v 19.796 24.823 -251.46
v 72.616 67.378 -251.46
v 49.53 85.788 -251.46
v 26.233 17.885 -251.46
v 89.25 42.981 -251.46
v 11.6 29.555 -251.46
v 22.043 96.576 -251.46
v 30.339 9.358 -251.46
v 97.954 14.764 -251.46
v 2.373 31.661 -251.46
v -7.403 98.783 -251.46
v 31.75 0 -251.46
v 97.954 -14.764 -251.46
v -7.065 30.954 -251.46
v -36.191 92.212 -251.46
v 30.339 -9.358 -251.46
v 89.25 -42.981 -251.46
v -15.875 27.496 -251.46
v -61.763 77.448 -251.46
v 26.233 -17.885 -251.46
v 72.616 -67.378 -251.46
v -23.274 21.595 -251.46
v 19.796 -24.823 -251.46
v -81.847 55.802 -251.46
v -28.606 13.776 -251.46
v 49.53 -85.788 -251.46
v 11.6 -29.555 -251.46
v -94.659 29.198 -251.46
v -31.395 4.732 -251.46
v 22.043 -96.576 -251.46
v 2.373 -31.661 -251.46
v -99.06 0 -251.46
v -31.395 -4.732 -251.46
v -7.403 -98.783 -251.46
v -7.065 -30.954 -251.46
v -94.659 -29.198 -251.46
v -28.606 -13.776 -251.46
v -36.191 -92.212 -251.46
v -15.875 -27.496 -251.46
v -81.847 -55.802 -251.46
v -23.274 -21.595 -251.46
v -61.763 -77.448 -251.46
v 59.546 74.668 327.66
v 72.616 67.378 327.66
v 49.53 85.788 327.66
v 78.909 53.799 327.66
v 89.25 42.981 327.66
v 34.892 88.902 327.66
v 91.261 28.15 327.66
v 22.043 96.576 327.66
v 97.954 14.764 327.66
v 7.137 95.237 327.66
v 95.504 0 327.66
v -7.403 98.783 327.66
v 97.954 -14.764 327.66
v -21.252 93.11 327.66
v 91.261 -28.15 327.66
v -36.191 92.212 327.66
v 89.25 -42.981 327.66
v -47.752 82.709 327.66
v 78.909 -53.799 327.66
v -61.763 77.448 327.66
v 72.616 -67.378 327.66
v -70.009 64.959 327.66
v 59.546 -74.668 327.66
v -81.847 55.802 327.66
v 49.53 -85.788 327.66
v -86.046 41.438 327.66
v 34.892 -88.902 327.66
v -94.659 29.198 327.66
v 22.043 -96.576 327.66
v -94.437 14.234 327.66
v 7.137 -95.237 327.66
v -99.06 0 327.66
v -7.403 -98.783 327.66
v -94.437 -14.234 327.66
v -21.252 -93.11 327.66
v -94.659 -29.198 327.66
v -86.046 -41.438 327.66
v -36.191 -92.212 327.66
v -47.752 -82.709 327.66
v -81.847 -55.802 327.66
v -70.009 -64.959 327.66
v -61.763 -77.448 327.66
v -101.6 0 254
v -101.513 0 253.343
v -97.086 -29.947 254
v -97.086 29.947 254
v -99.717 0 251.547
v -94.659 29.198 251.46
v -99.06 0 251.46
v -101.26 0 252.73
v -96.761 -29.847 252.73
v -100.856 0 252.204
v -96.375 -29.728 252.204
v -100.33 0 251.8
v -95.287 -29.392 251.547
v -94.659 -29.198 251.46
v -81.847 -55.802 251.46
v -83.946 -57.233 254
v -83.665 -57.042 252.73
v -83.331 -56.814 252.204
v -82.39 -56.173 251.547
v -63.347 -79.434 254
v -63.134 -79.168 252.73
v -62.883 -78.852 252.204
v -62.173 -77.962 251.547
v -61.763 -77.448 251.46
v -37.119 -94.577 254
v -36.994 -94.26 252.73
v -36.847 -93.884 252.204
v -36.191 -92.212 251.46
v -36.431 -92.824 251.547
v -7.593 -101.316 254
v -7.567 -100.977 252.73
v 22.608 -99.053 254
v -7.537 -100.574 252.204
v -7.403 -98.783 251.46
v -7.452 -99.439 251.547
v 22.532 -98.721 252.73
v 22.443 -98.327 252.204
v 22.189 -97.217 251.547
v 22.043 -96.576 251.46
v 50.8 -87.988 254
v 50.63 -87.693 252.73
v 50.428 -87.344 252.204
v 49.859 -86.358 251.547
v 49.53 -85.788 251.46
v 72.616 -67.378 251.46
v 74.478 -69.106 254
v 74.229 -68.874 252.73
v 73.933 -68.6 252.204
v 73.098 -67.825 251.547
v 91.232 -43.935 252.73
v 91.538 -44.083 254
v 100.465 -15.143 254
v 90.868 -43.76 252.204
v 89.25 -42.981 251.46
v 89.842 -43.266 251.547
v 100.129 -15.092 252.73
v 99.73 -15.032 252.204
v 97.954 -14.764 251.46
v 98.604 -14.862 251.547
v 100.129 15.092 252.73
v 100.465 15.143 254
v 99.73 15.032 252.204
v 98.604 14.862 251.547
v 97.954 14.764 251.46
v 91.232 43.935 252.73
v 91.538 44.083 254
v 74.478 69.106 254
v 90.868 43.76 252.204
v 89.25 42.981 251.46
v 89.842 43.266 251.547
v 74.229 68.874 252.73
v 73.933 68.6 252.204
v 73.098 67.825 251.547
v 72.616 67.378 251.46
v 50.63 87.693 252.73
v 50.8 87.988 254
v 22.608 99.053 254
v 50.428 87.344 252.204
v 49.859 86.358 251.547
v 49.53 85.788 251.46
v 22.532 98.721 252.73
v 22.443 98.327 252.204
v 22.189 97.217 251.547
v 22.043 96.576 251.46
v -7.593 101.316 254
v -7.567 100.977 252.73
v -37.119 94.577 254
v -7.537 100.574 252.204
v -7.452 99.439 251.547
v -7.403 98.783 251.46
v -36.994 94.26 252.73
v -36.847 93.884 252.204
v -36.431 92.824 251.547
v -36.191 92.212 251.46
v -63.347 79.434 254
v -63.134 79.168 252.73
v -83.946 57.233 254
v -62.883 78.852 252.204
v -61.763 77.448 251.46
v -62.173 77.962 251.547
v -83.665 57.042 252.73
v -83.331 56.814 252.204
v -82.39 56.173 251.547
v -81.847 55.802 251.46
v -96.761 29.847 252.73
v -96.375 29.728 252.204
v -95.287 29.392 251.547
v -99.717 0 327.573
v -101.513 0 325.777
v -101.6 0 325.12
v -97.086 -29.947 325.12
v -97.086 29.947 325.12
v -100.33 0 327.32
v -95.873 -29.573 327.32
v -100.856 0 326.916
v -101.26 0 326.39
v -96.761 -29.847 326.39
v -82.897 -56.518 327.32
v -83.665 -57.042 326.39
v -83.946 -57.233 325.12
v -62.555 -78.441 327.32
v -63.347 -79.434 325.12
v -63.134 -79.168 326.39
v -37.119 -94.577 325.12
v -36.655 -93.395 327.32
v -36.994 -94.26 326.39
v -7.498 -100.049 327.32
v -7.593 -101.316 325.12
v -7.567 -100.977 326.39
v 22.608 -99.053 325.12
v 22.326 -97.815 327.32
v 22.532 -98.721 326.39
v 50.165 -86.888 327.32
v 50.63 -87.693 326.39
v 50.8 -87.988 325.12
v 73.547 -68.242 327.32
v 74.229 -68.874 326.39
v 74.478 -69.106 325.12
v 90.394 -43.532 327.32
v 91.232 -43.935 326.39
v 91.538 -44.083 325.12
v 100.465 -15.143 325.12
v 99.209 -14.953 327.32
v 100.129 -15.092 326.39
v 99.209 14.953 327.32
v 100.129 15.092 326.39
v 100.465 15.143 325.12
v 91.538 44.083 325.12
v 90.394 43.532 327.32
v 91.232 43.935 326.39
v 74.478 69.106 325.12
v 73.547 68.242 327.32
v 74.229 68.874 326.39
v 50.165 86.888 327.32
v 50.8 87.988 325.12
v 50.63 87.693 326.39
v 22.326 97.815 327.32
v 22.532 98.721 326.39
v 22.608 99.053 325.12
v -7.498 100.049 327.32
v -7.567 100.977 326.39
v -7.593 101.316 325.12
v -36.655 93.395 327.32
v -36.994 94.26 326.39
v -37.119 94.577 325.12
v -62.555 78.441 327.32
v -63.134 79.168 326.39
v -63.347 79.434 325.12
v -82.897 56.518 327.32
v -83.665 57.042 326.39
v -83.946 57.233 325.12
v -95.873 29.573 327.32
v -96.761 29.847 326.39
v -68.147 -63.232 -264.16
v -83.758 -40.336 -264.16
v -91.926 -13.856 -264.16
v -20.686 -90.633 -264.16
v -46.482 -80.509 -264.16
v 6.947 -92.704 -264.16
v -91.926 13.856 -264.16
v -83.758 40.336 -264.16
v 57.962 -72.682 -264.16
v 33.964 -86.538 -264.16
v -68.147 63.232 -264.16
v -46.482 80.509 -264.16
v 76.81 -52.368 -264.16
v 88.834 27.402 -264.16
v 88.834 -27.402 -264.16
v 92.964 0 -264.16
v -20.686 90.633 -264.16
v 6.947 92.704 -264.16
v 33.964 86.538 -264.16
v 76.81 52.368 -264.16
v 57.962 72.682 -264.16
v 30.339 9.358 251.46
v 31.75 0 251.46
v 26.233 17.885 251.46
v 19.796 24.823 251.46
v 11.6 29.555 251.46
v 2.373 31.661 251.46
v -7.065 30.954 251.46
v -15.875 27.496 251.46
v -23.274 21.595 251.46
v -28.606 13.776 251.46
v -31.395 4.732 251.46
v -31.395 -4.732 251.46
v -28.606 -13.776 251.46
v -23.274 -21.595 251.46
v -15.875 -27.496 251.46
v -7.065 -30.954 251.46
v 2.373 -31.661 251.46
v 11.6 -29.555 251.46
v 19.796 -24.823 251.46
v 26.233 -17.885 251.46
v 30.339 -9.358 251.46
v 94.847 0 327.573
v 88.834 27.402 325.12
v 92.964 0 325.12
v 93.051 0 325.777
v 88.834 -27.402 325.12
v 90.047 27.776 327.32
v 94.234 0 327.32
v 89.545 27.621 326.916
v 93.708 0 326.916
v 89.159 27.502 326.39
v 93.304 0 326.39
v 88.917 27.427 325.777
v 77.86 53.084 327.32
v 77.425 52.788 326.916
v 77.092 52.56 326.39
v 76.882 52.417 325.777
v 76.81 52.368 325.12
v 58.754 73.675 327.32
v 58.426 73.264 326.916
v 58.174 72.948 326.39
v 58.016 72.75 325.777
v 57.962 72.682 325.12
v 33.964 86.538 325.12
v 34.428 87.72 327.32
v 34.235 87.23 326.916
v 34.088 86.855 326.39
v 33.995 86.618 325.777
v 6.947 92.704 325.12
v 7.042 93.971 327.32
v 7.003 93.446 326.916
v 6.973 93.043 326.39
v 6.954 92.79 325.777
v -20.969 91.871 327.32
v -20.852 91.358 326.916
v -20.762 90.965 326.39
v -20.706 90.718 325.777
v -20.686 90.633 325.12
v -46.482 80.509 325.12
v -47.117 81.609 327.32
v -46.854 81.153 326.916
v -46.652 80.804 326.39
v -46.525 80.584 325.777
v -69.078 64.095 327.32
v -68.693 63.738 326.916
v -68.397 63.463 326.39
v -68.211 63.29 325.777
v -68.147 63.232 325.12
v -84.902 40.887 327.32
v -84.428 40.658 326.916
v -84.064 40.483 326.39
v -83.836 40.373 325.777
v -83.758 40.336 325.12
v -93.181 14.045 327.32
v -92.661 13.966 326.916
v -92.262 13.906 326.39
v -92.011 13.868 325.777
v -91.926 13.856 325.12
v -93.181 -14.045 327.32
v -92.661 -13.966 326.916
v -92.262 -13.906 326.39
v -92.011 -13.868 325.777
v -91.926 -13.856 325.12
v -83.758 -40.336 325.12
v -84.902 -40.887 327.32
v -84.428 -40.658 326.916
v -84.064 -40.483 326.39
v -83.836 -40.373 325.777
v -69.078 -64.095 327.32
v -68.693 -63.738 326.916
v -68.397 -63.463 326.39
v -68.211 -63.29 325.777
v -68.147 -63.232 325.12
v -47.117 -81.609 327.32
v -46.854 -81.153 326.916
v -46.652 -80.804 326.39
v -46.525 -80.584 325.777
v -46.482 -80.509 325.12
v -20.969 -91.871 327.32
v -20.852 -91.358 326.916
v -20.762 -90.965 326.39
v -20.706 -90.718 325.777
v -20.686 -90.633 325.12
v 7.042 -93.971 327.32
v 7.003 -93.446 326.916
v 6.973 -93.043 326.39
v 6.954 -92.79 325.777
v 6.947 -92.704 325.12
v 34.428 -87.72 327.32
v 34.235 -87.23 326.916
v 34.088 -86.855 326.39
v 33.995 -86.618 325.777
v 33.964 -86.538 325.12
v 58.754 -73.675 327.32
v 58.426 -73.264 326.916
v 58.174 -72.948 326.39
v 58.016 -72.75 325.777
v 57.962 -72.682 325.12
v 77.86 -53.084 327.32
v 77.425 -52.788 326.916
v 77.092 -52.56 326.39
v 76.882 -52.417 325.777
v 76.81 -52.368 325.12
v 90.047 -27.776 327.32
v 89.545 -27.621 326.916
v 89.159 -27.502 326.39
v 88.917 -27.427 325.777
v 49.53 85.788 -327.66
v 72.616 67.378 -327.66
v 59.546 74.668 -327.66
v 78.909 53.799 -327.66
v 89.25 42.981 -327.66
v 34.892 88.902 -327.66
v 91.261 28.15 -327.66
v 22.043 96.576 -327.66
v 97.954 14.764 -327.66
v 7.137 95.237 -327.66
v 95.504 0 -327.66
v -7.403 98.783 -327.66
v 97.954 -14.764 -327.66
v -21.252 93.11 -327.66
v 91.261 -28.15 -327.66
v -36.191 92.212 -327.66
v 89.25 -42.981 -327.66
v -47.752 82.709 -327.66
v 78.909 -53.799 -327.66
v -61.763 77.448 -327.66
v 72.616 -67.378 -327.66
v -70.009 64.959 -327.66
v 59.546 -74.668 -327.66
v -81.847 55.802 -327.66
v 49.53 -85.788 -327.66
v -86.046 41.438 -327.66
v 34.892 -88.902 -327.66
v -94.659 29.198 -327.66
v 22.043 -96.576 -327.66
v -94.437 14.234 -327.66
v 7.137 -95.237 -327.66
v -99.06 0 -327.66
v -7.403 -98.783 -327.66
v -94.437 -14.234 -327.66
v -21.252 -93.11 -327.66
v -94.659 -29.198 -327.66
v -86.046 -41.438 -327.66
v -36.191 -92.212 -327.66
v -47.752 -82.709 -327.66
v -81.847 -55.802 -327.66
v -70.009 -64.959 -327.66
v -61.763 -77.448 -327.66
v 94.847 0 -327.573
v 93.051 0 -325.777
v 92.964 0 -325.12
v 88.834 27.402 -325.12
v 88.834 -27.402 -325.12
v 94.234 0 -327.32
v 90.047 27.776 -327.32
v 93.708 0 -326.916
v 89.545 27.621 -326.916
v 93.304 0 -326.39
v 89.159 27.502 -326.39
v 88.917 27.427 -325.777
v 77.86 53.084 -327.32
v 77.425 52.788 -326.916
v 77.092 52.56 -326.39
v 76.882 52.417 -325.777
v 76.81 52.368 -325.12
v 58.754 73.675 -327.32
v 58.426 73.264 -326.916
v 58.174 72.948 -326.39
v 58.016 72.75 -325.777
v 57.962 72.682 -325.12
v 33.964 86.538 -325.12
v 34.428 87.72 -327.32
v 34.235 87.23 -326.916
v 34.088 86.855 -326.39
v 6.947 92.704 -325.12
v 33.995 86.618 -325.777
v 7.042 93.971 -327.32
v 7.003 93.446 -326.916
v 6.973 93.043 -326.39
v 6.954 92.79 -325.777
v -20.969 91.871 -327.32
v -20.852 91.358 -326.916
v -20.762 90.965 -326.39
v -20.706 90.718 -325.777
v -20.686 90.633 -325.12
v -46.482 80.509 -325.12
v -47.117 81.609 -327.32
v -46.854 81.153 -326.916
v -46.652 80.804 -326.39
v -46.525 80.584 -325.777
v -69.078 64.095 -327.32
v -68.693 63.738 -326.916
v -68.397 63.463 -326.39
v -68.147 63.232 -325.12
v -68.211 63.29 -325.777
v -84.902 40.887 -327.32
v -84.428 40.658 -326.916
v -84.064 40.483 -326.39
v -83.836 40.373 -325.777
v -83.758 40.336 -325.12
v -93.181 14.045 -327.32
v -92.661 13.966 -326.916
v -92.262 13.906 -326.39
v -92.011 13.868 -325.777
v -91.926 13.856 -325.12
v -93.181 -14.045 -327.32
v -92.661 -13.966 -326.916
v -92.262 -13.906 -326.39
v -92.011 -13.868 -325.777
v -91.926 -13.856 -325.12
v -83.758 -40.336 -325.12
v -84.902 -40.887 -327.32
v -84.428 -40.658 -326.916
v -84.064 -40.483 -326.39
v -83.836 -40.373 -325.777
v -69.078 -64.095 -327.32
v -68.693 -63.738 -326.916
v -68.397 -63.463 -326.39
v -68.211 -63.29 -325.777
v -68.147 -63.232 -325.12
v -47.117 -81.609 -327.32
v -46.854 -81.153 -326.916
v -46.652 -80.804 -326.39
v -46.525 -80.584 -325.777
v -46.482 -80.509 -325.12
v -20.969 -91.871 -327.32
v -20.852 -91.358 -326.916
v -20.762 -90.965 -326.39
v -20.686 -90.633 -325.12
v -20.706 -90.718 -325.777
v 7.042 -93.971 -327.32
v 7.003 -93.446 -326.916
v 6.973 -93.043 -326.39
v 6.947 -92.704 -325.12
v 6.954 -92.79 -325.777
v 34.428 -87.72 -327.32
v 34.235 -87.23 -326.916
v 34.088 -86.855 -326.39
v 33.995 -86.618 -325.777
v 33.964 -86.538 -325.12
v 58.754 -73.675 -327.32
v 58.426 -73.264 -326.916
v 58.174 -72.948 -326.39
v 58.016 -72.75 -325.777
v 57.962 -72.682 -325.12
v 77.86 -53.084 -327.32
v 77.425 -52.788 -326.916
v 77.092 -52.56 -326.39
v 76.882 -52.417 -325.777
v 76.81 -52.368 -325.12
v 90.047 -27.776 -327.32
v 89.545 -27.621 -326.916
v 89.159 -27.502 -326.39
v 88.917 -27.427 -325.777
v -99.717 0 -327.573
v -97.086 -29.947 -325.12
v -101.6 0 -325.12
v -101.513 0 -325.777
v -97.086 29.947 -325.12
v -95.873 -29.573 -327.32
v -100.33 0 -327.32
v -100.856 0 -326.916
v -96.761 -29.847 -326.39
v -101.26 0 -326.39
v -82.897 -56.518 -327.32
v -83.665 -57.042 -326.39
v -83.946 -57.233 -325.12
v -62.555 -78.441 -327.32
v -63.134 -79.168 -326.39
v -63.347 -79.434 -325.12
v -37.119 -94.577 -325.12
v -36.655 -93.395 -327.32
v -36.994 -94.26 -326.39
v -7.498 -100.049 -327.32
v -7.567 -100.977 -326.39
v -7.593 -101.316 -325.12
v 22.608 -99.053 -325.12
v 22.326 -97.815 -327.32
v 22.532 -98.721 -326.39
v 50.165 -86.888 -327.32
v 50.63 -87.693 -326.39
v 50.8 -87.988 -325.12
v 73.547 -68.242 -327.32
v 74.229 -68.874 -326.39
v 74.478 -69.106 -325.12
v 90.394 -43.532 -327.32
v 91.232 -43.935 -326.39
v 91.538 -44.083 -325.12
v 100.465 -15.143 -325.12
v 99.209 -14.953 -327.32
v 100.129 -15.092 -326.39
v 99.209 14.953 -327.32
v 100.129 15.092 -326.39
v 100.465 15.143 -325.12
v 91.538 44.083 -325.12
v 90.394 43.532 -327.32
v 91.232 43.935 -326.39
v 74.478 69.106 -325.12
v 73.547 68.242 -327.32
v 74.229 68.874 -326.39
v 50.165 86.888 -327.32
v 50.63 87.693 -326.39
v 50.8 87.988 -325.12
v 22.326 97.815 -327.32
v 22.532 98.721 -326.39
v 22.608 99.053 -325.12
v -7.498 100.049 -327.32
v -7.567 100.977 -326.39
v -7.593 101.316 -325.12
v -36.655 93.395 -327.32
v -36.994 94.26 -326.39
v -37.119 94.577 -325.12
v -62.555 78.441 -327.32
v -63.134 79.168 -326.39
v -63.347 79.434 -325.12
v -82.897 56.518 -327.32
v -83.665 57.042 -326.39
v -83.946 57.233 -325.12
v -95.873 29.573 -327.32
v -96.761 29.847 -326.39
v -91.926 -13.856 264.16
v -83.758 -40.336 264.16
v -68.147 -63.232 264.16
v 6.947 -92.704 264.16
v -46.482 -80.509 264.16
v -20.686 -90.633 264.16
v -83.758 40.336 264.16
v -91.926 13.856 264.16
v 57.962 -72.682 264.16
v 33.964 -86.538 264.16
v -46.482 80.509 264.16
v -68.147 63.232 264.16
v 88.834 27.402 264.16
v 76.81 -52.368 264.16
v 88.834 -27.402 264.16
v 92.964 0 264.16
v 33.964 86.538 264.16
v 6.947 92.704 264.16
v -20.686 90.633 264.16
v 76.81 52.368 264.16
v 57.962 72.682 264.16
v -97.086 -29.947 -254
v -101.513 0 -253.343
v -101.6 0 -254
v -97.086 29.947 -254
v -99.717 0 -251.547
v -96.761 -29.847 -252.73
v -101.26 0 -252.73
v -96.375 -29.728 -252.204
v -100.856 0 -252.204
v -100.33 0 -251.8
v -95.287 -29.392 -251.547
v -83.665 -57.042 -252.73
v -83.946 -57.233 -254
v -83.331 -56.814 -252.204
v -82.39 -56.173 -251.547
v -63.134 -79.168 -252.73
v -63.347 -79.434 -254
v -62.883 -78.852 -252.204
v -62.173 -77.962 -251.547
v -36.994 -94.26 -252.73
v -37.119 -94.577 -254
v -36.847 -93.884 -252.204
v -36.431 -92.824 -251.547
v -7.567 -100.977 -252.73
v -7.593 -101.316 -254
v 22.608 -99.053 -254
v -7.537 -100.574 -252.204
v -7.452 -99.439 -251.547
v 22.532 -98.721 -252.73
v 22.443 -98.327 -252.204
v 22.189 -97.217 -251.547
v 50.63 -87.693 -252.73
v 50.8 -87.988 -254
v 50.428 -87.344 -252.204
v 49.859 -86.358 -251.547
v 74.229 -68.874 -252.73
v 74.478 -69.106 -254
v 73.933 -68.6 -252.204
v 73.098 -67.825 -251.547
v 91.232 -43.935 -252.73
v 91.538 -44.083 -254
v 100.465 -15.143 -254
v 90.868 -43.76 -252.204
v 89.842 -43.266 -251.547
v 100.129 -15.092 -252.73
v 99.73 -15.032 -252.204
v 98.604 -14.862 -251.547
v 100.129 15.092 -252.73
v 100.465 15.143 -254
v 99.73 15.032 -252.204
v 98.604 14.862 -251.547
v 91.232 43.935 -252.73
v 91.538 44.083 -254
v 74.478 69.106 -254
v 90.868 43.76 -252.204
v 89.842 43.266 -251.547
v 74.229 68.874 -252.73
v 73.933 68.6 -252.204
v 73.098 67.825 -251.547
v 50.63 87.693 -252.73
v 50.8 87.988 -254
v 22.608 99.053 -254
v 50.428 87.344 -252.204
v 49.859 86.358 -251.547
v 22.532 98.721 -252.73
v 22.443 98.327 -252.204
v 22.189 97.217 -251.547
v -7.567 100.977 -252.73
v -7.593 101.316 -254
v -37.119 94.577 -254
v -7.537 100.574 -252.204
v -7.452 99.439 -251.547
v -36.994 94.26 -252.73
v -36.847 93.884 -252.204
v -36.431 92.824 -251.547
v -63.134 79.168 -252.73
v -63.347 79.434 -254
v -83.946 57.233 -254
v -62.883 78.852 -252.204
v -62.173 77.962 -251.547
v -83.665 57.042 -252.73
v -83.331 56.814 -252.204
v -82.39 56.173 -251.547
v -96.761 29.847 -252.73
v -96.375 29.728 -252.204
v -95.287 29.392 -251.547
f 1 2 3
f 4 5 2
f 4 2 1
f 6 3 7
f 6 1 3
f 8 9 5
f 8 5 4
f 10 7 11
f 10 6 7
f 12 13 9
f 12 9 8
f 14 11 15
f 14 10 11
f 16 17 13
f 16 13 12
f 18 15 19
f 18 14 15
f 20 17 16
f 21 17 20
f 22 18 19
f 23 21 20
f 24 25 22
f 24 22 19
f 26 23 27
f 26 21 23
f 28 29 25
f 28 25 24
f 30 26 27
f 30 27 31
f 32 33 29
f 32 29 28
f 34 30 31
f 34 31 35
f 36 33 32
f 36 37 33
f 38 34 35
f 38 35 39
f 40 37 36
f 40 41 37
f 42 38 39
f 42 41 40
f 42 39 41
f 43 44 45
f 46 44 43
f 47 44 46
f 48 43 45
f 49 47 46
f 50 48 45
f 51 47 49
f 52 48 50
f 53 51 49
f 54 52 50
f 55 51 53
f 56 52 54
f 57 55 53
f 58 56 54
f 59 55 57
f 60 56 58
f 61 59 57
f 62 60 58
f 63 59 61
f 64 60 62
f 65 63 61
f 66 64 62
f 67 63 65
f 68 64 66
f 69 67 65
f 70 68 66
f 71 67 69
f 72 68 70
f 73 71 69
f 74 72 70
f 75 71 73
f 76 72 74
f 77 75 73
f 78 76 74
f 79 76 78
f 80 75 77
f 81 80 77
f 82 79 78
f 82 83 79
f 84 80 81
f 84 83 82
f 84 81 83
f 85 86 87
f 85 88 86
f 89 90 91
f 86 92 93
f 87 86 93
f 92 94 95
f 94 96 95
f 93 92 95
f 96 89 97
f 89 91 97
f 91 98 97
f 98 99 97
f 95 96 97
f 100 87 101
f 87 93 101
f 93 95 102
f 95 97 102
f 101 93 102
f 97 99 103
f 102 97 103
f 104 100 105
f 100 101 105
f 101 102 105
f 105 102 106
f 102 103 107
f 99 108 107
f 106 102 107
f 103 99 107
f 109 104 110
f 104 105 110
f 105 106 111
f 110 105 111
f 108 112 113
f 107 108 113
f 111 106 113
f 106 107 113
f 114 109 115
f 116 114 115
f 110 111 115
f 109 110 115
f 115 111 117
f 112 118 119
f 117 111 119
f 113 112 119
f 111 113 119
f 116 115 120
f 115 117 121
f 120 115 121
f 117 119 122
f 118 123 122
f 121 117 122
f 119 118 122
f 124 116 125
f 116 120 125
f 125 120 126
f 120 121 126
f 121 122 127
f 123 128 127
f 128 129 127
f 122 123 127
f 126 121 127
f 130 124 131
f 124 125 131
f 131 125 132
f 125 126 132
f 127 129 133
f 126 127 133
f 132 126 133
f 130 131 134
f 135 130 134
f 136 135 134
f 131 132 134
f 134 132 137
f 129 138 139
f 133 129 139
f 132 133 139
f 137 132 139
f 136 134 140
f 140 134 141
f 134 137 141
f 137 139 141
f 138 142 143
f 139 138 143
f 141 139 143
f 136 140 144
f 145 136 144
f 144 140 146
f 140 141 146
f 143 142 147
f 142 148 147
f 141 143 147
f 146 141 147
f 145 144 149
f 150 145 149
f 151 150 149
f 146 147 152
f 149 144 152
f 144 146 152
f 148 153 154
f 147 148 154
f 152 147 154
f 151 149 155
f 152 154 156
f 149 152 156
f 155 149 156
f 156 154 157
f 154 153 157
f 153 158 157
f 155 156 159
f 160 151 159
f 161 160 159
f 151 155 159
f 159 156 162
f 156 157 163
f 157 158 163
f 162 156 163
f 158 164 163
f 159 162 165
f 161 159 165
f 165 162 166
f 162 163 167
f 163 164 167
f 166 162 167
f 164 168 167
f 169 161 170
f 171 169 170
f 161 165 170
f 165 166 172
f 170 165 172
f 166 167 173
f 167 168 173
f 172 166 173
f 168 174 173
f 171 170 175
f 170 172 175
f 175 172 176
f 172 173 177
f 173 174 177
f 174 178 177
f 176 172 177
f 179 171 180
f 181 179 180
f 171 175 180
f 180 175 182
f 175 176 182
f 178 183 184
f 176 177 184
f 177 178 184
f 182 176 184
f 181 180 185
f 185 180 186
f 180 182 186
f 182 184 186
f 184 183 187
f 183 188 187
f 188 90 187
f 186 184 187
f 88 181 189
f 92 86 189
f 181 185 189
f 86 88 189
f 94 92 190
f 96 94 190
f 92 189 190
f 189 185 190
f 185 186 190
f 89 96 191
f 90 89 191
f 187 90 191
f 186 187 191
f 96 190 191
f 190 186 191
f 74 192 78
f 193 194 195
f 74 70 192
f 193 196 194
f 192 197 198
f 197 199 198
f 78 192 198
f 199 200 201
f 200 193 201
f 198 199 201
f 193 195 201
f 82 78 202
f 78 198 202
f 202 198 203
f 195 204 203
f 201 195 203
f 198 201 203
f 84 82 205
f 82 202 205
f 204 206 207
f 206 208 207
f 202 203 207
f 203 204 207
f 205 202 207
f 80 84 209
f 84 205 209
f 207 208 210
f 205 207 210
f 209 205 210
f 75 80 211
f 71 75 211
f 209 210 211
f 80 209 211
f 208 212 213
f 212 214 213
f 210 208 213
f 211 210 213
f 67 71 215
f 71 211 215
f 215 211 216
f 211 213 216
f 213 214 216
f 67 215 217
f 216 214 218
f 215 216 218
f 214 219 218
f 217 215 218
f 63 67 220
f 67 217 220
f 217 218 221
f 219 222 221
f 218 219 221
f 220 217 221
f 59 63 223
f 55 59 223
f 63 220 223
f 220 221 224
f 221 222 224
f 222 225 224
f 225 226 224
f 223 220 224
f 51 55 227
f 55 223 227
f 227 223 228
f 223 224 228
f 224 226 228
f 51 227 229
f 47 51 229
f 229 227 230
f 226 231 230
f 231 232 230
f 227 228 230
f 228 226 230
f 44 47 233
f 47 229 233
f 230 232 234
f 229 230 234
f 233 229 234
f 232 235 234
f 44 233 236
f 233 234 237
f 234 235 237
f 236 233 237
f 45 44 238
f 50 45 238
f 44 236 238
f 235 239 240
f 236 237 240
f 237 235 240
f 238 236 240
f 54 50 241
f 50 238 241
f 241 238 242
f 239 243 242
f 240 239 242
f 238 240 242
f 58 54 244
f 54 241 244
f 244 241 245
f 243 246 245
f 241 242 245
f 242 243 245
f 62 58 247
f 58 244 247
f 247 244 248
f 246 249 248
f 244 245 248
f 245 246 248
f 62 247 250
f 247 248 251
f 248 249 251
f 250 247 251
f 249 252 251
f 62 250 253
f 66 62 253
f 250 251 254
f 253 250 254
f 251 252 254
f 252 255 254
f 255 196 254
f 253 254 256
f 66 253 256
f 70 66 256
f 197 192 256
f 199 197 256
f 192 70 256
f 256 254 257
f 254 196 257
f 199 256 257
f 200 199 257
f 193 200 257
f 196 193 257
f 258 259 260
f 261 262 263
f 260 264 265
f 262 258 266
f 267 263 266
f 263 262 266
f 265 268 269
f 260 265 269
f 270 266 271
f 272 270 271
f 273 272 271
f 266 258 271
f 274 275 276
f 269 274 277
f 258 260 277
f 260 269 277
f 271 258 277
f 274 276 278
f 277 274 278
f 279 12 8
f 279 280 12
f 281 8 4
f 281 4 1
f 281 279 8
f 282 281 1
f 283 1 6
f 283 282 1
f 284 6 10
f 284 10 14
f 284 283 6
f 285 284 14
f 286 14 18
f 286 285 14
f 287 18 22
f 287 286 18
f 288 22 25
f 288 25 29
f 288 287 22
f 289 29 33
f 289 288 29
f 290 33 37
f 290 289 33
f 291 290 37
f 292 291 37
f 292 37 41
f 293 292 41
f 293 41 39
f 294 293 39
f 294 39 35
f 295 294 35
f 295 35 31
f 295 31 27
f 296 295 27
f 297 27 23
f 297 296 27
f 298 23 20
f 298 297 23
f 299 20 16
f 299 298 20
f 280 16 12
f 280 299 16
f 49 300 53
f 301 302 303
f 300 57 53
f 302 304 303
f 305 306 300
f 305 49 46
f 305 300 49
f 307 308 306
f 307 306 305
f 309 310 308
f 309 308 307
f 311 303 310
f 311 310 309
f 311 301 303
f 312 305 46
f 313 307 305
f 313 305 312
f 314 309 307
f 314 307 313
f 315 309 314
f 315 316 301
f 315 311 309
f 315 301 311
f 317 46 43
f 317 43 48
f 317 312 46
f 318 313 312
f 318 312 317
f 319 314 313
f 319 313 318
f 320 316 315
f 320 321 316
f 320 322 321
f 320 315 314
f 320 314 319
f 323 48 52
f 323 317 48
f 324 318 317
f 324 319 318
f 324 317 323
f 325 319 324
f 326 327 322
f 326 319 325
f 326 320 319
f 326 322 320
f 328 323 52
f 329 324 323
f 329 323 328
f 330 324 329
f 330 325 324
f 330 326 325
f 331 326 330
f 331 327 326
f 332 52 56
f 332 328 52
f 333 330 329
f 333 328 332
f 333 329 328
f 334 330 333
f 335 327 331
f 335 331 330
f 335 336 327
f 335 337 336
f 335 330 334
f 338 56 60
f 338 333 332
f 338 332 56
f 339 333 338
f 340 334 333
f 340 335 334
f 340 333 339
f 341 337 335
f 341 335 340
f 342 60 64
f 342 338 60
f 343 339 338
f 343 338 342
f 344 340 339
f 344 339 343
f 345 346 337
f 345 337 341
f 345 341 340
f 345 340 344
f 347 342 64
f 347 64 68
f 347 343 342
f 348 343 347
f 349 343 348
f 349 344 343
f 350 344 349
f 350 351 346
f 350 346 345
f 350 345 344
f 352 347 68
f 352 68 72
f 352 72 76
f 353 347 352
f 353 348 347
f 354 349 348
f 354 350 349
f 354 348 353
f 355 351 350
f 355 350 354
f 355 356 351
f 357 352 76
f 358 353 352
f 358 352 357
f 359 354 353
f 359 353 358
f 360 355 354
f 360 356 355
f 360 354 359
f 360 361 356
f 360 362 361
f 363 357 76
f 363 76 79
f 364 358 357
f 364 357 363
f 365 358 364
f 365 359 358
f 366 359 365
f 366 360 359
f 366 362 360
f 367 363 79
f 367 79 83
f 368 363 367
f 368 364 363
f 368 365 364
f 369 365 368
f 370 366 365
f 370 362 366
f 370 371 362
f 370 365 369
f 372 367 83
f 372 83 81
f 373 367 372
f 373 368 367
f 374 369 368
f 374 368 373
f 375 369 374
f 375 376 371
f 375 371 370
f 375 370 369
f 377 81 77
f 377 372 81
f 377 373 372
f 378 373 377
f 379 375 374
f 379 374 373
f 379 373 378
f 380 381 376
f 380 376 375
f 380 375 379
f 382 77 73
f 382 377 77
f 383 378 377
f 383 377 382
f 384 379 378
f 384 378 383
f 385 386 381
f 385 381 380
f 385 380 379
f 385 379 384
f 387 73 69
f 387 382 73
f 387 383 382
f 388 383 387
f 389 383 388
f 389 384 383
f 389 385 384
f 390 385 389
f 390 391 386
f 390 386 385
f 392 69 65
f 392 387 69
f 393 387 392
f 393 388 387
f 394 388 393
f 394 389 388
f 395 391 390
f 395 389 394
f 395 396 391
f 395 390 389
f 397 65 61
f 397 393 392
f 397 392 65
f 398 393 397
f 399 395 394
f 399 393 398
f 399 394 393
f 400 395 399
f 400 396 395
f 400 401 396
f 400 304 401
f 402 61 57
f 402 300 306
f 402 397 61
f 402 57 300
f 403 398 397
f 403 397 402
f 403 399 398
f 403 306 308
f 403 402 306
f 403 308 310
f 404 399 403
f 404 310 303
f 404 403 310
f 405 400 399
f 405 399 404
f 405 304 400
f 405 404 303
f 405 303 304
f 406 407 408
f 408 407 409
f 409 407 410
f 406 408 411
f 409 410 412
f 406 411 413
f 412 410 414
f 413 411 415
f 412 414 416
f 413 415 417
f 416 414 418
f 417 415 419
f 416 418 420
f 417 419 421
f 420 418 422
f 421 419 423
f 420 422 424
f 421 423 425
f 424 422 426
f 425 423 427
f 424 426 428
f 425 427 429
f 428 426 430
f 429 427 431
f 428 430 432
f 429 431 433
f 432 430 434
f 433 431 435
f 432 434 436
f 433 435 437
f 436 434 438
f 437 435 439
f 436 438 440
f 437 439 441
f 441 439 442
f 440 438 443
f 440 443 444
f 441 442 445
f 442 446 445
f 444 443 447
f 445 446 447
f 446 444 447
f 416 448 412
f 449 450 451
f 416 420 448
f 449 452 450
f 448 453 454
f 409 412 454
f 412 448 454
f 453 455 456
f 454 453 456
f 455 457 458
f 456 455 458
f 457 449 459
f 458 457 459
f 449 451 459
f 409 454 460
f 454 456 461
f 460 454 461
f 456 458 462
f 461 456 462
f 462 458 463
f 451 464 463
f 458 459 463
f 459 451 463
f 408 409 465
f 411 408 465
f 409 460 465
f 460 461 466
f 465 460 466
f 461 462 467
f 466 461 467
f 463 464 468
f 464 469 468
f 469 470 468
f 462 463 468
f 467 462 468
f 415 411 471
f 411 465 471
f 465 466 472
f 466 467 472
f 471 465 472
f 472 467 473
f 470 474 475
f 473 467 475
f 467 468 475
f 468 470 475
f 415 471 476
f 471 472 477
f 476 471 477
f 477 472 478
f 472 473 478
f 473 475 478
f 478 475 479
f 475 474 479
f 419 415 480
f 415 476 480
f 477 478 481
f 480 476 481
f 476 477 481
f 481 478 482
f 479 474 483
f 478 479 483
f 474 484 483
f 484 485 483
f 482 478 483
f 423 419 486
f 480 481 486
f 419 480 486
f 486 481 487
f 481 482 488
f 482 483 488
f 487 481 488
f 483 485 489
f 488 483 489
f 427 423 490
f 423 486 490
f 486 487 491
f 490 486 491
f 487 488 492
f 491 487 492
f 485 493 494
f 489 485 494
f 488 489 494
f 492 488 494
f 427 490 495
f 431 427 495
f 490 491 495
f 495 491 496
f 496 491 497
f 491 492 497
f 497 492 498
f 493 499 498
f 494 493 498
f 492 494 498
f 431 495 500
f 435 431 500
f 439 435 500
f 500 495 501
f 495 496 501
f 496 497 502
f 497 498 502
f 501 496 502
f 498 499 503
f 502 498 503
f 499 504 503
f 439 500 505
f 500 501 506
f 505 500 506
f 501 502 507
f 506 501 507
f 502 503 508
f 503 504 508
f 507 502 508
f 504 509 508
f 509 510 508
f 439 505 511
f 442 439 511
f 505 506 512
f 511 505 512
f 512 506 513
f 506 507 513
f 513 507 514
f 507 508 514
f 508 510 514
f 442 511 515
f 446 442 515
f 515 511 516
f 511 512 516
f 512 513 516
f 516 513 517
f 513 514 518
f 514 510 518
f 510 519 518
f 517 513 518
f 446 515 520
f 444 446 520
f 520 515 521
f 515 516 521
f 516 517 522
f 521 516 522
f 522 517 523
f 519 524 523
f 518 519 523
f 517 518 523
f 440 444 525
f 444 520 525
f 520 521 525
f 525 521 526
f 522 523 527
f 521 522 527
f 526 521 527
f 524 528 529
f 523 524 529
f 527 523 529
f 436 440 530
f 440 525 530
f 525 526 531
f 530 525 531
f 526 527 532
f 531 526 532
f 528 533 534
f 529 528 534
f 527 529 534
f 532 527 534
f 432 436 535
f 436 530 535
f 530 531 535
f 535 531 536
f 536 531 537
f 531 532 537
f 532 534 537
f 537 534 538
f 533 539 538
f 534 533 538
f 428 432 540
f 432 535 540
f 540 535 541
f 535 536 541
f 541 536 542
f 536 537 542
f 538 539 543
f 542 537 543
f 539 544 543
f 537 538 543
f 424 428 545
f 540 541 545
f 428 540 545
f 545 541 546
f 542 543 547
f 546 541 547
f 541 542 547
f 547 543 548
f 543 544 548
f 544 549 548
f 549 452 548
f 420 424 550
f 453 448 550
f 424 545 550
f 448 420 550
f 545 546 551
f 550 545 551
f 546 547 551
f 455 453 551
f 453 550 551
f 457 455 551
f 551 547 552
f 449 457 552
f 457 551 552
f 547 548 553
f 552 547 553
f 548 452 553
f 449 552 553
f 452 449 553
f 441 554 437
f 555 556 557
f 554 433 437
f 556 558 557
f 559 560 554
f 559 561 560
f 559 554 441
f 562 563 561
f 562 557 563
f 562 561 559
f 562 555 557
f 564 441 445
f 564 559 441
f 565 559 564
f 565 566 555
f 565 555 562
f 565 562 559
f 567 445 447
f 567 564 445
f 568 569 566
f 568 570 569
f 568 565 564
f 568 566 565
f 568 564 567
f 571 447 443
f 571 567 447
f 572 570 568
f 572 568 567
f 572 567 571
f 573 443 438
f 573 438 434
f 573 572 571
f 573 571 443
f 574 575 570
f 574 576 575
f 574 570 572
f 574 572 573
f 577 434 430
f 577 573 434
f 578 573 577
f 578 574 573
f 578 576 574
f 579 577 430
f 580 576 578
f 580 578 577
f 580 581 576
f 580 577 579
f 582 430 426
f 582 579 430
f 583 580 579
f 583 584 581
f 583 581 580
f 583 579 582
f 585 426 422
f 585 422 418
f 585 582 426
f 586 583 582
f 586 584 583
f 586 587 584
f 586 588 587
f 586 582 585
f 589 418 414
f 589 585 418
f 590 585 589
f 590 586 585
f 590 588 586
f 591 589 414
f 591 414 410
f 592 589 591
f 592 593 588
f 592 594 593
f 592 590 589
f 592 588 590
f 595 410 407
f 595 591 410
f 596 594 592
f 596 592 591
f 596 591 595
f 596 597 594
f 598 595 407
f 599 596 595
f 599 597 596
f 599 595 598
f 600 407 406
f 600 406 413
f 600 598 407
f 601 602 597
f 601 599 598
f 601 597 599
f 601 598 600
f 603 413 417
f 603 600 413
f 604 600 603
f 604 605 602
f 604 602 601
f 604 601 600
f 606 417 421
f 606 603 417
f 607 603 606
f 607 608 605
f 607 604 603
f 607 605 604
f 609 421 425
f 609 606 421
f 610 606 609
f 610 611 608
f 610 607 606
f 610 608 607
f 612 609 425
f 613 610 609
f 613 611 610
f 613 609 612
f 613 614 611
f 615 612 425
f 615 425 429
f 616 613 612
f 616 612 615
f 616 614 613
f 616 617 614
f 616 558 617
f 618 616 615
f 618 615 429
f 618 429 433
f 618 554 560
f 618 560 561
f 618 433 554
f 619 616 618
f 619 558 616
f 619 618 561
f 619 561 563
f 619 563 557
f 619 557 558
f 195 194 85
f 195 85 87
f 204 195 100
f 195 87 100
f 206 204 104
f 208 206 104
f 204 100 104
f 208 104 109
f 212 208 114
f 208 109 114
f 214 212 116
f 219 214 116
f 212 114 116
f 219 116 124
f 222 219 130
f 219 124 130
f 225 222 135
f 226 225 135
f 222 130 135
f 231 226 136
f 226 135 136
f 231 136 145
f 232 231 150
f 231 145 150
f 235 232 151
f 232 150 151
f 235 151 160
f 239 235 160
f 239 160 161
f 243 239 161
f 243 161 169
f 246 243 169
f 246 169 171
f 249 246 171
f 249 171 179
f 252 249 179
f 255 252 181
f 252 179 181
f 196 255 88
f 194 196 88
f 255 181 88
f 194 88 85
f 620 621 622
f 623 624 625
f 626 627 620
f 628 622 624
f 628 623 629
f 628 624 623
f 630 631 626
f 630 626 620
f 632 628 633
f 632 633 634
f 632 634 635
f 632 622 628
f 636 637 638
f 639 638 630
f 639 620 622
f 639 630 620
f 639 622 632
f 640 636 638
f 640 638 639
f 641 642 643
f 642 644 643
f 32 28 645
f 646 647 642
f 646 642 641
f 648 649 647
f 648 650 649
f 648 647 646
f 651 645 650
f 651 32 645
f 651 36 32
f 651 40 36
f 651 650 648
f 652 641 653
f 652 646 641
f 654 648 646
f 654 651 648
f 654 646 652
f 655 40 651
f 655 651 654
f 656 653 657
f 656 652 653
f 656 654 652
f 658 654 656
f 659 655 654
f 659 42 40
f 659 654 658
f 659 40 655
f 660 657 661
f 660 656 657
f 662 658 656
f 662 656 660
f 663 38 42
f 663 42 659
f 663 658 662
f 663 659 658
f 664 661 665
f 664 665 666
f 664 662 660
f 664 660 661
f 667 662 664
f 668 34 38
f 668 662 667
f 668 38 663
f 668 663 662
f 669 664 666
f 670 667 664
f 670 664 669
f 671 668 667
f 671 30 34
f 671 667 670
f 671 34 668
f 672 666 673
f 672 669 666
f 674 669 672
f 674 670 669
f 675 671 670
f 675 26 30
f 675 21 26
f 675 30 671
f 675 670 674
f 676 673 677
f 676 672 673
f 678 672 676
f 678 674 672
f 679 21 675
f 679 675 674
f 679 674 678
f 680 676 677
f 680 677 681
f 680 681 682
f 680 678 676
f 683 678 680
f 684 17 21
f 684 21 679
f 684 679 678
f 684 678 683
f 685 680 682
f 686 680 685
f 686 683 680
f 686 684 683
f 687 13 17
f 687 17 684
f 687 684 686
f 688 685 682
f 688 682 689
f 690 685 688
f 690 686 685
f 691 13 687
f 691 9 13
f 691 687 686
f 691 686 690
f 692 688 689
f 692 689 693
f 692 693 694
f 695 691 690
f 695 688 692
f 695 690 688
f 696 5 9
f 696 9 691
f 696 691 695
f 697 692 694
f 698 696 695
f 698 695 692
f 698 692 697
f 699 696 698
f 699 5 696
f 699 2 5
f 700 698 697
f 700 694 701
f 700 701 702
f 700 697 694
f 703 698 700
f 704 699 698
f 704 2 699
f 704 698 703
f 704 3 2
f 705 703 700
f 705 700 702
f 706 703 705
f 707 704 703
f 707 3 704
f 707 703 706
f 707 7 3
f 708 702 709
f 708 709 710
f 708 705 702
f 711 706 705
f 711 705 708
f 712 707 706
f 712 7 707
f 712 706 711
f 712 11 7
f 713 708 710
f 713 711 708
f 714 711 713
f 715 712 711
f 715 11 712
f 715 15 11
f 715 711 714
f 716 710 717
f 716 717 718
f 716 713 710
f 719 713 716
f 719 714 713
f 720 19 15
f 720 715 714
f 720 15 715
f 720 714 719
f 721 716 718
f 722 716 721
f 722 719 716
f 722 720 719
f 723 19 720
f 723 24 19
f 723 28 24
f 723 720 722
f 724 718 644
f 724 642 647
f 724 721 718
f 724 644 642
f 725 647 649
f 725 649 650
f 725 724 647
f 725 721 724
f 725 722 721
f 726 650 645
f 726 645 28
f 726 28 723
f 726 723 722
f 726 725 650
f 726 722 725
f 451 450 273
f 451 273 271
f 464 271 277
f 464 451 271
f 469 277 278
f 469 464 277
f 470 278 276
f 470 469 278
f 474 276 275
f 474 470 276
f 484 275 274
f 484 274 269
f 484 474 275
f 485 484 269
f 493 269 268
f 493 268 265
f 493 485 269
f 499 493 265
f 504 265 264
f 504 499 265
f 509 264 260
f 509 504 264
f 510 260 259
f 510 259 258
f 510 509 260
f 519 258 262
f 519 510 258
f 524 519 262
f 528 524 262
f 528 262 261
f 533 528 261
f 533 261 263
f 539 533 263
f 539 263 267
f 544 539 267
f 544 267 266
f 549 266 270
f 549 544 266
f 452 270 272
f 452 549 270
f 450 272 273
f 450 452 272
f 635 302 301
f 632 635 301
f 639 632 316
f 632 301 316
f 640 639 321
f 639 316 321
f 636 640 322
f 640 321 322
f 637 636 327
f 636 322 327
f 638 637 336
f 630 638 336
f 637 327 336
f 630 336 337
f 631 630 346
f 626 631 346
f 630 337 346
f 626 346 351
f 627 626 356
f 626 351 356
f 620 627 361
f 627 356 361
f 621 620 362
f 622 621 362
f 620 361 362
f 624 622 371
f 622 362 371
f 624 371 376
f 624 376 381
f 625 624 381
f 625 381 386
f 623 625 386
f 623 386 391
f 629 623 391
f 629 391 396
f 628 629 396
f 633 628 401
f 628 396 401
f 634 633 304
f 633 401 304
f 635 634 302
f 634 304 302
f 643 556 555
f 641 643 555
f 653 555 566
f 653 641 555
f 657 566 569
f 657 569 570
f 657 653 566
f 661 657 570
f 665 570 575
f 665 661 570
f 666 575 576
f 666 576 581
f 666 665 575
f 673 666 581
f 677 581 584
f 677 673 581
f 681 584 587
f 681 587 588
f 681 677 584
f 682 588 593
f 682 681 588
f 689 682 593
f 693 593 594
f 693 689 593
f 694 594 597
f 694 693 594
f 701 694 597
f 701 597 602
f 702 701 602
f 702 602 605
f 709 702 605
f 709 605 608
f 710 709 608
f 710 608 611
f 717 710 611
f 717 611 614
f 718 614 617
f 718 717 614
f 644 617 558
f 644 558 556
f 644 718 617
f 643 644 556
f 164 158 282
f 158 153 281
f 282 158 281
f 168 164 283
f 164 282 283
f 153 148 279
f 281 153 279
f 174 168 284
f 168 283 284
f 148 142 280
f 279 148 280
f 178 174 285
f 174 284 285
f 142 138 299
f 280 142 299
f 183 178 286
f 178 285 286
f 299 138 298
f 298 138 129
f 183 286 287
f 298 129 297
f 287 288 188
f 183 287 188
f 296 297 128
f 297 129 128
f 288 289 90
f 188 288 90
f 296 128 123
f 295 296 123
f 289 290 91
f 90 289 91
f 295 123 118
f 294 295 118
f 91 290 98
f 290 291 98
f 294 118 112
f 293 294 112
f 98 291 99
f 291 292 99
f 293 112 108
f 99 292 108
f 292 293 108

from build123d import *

# Parameters (mm, degrees)
SKETCH4_R            = 31.75
BOSS_EXTRUDE3_DEPTH  = 251.46
SKETCH5_R            = 101.6
BOSS_EXTRUDE4_DEPTH  = 76.2
SKETCH6_R            = 92.964
CUT_EXTRUDE1_DEPTH   = 63.5
FILLET1_R            = 2.54
FILLET2_R            = 2.54
FILLET1_OF_MIRROR1_R = 2.54
FILLET2_OF_MIRROR1_R = 2.54


with BuildPart() as part:
    # Sketch4 → Boss-Extrude3 (new, symmetric)
    with BuildSketch(Plane.XY):
        Circle(SKETCH4_R)
    extrude(amount=BOSS_EXTRUDE3_DEPTH, both=True)

    # Sketch5 → Boss-Extrude4 (add)
    with BuildSketch(Plane.XY.offset(251.46)):
        with Locations(Location((0, 0, 0), (0, 0, 180))):
            Circle(SKETCH5_R)
    boss_extrude4 = extrude(amount=BOSS_EXTRUDE4_DEPTH)

    # Sketch6 → Cut-Extrude1 (cut)
    with BuildSketch(Plane.XY.offset(327.66)):
        Circle(SKETCH6_R)
    cut_extrude1 = extrude(amount=-CUT_EXTRUDE1_DEPTH, mode=Mode.SUBTRACT)

    # Fillet1
    fillet1_edges = [part.edges().sort_by_distance(p)[0] for p in [
        (-92.964, 0, 327.66),
    ]]
    fillet(fillet1_edges, radius=FILLET1_R)

    # Fillet2
    fillet2_edges = [part.edges().sort_by_distance(p)[0] for p in [
        (101.6, 0, 251.46),
        (101.6, 0, 327.66),
    ]]
    fillet(fillet2_edges, radius=FILLET2_R)

    # Mirror1: Boss-Extrude4, Cut-Extrude1 across plane
    add(boss_extrude4.mirror(Plane.XY))
    add(cut_extrude1.mirror(Plane.XY), mode=Mode.SUBTRACT)

    # Fillet1 of Mirror1
    fillet1_of_mirror1_edges = [part.edges().sort_by_distance(p)[0] for p in [
        (-92.964, 0, -327.66),
    ]]
    fillet(fillet1_of_mirror1_edges, radius=FILLET1_OF_MIRROR1_R)

    # Fillet2 of Mirror1
    fillet2_of_mirror1_edges = [part.edges().sort_by_distance(p)[0] for p in [
        (101.6, 0, -251.46),
        (101.6, 0, -327.66),
    ]]
    fillet(fillet2_of_mirror1_edges, radius=FILLET2_OF_MIRROR1_R)


solid = part.part
